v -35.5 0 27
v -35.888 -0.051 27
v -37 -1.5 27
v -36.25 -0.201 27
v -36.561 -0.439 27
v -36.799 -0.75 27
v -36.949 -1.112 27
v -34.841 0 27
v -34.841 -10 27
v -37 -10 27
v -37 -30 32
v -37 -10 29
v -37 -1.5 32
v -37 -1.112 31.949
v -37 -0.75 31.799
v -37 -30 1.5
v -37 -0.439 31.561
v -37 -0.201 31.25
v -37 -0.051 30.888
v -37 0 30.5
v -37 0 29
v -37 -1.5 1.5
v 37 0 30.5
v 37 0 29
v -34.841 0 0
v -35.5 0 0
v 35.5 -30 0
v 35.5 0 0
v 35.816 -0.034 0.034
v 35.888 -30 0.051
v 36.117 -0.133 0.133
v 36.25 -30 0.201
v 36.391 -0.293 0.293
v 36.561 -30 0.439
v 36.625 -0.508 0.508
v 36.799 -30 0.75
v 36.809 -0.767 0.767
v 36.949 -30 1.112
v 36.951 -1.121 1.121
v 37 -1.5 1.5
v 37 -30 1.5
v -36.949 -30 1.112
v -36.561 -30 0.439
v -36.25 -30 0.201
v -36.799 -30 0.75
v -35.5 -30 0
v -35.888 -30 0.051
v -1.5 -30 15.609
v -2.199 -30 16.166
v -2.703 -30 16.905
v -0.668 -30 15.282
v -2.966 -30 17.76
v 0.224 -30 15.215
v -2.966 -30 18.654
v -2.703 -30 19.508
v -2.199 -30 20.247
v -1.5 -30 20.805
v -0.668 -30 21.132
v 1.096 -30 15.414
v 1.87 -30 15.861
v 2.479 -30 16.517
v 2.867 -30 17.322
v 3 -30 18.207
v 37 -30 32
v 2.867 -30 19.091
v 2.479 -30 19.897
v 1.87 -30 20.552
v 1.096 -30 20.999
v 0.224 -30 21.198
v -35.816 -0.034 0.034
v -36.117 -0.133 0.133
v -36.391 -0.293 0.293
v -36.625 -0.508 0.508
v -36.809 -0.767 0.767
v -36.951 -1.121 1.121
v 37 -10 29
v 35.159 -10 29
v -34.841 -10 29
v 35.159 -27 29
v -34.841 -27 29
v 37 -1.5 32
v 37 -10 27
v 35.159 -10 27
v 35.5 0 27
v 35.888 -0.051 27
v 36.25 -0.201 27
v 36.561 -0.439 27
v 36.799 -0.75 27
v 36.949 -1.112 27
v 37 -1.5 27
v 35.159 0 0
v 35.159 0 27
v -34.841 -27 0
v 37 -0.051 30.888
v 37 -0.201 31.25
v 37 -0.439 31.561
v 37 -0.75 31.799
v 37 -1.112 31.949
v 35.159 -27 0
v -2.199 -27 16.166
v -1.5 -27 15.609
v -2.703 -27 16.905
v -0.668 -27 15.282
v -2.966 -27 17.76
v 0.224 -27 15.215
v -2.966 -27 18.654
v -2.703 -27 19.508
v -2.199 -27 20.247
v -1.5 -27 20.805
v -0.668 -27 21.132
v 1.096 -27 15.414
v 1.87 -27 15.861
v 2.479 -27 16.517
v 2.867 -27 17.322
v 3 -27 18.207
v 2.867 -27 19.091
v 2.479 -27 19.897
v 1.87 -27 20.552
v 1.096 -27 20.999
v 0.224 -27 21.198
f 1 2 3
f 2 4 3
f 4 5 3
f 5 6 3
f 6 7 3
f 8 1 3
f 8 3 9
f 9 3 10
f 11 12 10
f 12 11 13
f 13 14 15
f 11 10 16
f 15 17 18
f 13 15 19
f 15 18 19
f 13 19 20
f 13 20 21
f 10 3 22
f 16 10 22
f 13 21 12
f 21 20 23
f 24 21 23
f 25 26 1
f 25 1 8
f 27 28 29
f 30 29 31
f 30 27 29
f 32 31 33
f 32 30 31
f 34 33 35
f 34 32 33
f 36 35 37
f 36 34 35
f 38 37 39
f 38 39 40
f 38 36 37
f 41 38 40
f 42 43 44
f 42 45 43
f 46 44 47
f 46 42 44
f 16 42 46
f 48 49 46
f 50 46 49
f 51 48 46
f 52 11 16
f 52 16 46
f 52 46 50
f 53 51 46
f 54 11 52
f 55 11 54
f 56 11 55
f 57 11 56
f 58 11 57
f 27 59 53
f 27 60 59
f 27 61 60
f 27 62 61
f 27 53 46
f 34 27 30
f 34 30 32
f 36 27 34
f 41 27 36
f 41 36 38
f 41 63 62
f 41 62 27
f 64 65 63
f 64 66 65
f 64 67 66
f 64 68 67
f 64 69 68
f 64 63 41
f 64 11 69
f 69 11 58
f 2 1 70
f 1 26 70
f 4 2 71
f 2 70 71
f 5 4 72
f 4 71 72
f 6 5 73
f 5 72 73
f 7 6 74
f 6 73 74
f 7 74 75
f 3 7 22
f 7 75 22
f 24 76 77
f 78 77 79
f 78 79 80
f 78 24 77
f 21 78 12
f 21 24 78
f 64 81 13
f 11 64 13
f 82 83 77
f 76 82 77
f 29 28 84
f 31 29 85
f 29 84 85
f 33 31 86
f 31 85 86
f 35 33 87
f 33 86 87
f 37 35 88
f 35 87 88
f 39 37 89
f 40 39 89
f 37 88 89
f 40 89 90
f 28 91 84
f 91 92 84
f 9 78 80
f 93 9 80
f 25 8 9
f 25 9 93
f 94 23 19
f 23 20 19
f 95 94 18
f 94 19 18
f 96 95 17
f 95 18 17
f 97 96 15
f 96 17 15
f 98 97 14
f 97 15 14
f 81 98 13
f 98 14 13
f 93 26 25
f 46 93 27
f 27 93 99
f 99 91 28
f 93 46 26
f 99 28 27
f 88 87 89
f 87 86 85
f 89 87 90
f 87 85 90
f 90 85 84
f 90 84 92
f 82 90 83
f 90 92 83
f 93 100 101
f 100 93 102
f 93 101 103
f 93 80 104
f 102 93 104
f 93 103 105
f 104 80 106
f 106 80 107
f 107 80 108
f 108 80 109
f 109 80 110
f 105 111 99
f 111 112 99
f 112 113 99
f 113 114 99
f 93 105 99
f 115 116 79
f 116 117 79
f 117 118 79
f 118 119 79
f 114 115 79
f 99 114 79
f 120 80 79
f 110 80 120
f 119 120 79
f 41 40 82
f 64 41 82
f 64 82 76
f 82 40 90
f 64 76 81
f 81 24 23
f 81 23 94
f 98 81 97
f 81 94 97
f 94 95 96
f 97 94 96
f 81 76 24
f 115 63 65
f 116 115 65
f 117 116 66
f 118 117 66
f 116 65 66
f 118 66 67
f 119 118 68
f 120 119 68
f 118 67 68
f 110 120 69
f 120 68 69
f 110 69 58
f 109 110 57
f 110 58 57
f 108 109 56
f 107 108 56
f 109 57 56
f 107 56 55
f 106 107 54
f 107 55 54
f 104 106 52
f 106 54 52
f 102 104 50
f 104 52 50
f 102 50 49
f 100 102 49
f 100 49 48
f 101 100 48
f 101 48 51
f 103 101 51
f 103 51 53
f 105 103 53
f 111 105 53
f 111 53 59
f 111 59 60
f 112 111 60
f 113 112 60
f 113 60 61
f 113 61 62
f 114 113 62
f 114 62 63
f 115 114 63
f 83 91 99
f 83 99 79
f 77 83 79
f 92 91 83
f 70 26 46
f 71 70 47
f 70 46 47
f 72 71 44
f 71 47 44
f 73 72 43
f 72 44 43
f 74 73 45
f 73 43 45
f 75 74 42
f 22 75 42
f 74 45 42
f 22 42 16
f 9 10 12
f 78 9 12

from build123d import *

# Parameters (mm, degrees)
F2_DEPTH = 30
F3_DEPTH = 27
F4_W     = 10
F4_H     = 2
F5_DEPTH = 74.5
F6_R     = 3
F7_DEPTH = 25
F8_R     = 1.5


with BuildPart() as f2:
    # F0 (on Front) → F2 (new body)
    with BuildSketch(Plane.XZ):
        Polygon((-37, 0), (0, 0), (37, 0), (37, 32), (-37, 32), align=None)
    extrude(amount=F2_DEPTH)

    # F1 (on face) → F3 (cut)
    with BuildSketch(Plane.XZ):
        Polygon((-34.841463, 29), (-34.841463, 0), (0, 0), (35.158537, 0), (35.158537, 29), align=None)
    extrude(amount=F3_DEPTH, mode=Mode.SUBTRACT)

    # F4 (on face) → F5 (cut)
    with BuildSketch(Plane(origin=(-37, 0, 0), x_dir=(0, -1, 0), z_dir=(-1, 0, 0))):
        with Locations((5, 28)):
            Rectangle(F4_W, F4_H)
    extrude(amount=-F5_DEPTH, mode=Mode.SUBTRACT)

    # F6 (on face) → F7 (cut)
    with BuildSketch(Plane.XZ.offset(30)):
        with Locations((0, 18.206734)):
            Circle(F6_R)
    extrude(amount=-F7_DEPTH, mode=Mode.SUBTRACT)

    # F8
    f8_edges = [f2.edges().sort_by_distance(p)[0] for p in [
        (37, -15, 0),
        (0, 0, 32),
        (-37, -15, 0),
        (-37, 0, 13.5),
        (37, 0, 13.5),
    ]]
    fillet(f8_edges, radius=F8_R)


solid = f2.part
